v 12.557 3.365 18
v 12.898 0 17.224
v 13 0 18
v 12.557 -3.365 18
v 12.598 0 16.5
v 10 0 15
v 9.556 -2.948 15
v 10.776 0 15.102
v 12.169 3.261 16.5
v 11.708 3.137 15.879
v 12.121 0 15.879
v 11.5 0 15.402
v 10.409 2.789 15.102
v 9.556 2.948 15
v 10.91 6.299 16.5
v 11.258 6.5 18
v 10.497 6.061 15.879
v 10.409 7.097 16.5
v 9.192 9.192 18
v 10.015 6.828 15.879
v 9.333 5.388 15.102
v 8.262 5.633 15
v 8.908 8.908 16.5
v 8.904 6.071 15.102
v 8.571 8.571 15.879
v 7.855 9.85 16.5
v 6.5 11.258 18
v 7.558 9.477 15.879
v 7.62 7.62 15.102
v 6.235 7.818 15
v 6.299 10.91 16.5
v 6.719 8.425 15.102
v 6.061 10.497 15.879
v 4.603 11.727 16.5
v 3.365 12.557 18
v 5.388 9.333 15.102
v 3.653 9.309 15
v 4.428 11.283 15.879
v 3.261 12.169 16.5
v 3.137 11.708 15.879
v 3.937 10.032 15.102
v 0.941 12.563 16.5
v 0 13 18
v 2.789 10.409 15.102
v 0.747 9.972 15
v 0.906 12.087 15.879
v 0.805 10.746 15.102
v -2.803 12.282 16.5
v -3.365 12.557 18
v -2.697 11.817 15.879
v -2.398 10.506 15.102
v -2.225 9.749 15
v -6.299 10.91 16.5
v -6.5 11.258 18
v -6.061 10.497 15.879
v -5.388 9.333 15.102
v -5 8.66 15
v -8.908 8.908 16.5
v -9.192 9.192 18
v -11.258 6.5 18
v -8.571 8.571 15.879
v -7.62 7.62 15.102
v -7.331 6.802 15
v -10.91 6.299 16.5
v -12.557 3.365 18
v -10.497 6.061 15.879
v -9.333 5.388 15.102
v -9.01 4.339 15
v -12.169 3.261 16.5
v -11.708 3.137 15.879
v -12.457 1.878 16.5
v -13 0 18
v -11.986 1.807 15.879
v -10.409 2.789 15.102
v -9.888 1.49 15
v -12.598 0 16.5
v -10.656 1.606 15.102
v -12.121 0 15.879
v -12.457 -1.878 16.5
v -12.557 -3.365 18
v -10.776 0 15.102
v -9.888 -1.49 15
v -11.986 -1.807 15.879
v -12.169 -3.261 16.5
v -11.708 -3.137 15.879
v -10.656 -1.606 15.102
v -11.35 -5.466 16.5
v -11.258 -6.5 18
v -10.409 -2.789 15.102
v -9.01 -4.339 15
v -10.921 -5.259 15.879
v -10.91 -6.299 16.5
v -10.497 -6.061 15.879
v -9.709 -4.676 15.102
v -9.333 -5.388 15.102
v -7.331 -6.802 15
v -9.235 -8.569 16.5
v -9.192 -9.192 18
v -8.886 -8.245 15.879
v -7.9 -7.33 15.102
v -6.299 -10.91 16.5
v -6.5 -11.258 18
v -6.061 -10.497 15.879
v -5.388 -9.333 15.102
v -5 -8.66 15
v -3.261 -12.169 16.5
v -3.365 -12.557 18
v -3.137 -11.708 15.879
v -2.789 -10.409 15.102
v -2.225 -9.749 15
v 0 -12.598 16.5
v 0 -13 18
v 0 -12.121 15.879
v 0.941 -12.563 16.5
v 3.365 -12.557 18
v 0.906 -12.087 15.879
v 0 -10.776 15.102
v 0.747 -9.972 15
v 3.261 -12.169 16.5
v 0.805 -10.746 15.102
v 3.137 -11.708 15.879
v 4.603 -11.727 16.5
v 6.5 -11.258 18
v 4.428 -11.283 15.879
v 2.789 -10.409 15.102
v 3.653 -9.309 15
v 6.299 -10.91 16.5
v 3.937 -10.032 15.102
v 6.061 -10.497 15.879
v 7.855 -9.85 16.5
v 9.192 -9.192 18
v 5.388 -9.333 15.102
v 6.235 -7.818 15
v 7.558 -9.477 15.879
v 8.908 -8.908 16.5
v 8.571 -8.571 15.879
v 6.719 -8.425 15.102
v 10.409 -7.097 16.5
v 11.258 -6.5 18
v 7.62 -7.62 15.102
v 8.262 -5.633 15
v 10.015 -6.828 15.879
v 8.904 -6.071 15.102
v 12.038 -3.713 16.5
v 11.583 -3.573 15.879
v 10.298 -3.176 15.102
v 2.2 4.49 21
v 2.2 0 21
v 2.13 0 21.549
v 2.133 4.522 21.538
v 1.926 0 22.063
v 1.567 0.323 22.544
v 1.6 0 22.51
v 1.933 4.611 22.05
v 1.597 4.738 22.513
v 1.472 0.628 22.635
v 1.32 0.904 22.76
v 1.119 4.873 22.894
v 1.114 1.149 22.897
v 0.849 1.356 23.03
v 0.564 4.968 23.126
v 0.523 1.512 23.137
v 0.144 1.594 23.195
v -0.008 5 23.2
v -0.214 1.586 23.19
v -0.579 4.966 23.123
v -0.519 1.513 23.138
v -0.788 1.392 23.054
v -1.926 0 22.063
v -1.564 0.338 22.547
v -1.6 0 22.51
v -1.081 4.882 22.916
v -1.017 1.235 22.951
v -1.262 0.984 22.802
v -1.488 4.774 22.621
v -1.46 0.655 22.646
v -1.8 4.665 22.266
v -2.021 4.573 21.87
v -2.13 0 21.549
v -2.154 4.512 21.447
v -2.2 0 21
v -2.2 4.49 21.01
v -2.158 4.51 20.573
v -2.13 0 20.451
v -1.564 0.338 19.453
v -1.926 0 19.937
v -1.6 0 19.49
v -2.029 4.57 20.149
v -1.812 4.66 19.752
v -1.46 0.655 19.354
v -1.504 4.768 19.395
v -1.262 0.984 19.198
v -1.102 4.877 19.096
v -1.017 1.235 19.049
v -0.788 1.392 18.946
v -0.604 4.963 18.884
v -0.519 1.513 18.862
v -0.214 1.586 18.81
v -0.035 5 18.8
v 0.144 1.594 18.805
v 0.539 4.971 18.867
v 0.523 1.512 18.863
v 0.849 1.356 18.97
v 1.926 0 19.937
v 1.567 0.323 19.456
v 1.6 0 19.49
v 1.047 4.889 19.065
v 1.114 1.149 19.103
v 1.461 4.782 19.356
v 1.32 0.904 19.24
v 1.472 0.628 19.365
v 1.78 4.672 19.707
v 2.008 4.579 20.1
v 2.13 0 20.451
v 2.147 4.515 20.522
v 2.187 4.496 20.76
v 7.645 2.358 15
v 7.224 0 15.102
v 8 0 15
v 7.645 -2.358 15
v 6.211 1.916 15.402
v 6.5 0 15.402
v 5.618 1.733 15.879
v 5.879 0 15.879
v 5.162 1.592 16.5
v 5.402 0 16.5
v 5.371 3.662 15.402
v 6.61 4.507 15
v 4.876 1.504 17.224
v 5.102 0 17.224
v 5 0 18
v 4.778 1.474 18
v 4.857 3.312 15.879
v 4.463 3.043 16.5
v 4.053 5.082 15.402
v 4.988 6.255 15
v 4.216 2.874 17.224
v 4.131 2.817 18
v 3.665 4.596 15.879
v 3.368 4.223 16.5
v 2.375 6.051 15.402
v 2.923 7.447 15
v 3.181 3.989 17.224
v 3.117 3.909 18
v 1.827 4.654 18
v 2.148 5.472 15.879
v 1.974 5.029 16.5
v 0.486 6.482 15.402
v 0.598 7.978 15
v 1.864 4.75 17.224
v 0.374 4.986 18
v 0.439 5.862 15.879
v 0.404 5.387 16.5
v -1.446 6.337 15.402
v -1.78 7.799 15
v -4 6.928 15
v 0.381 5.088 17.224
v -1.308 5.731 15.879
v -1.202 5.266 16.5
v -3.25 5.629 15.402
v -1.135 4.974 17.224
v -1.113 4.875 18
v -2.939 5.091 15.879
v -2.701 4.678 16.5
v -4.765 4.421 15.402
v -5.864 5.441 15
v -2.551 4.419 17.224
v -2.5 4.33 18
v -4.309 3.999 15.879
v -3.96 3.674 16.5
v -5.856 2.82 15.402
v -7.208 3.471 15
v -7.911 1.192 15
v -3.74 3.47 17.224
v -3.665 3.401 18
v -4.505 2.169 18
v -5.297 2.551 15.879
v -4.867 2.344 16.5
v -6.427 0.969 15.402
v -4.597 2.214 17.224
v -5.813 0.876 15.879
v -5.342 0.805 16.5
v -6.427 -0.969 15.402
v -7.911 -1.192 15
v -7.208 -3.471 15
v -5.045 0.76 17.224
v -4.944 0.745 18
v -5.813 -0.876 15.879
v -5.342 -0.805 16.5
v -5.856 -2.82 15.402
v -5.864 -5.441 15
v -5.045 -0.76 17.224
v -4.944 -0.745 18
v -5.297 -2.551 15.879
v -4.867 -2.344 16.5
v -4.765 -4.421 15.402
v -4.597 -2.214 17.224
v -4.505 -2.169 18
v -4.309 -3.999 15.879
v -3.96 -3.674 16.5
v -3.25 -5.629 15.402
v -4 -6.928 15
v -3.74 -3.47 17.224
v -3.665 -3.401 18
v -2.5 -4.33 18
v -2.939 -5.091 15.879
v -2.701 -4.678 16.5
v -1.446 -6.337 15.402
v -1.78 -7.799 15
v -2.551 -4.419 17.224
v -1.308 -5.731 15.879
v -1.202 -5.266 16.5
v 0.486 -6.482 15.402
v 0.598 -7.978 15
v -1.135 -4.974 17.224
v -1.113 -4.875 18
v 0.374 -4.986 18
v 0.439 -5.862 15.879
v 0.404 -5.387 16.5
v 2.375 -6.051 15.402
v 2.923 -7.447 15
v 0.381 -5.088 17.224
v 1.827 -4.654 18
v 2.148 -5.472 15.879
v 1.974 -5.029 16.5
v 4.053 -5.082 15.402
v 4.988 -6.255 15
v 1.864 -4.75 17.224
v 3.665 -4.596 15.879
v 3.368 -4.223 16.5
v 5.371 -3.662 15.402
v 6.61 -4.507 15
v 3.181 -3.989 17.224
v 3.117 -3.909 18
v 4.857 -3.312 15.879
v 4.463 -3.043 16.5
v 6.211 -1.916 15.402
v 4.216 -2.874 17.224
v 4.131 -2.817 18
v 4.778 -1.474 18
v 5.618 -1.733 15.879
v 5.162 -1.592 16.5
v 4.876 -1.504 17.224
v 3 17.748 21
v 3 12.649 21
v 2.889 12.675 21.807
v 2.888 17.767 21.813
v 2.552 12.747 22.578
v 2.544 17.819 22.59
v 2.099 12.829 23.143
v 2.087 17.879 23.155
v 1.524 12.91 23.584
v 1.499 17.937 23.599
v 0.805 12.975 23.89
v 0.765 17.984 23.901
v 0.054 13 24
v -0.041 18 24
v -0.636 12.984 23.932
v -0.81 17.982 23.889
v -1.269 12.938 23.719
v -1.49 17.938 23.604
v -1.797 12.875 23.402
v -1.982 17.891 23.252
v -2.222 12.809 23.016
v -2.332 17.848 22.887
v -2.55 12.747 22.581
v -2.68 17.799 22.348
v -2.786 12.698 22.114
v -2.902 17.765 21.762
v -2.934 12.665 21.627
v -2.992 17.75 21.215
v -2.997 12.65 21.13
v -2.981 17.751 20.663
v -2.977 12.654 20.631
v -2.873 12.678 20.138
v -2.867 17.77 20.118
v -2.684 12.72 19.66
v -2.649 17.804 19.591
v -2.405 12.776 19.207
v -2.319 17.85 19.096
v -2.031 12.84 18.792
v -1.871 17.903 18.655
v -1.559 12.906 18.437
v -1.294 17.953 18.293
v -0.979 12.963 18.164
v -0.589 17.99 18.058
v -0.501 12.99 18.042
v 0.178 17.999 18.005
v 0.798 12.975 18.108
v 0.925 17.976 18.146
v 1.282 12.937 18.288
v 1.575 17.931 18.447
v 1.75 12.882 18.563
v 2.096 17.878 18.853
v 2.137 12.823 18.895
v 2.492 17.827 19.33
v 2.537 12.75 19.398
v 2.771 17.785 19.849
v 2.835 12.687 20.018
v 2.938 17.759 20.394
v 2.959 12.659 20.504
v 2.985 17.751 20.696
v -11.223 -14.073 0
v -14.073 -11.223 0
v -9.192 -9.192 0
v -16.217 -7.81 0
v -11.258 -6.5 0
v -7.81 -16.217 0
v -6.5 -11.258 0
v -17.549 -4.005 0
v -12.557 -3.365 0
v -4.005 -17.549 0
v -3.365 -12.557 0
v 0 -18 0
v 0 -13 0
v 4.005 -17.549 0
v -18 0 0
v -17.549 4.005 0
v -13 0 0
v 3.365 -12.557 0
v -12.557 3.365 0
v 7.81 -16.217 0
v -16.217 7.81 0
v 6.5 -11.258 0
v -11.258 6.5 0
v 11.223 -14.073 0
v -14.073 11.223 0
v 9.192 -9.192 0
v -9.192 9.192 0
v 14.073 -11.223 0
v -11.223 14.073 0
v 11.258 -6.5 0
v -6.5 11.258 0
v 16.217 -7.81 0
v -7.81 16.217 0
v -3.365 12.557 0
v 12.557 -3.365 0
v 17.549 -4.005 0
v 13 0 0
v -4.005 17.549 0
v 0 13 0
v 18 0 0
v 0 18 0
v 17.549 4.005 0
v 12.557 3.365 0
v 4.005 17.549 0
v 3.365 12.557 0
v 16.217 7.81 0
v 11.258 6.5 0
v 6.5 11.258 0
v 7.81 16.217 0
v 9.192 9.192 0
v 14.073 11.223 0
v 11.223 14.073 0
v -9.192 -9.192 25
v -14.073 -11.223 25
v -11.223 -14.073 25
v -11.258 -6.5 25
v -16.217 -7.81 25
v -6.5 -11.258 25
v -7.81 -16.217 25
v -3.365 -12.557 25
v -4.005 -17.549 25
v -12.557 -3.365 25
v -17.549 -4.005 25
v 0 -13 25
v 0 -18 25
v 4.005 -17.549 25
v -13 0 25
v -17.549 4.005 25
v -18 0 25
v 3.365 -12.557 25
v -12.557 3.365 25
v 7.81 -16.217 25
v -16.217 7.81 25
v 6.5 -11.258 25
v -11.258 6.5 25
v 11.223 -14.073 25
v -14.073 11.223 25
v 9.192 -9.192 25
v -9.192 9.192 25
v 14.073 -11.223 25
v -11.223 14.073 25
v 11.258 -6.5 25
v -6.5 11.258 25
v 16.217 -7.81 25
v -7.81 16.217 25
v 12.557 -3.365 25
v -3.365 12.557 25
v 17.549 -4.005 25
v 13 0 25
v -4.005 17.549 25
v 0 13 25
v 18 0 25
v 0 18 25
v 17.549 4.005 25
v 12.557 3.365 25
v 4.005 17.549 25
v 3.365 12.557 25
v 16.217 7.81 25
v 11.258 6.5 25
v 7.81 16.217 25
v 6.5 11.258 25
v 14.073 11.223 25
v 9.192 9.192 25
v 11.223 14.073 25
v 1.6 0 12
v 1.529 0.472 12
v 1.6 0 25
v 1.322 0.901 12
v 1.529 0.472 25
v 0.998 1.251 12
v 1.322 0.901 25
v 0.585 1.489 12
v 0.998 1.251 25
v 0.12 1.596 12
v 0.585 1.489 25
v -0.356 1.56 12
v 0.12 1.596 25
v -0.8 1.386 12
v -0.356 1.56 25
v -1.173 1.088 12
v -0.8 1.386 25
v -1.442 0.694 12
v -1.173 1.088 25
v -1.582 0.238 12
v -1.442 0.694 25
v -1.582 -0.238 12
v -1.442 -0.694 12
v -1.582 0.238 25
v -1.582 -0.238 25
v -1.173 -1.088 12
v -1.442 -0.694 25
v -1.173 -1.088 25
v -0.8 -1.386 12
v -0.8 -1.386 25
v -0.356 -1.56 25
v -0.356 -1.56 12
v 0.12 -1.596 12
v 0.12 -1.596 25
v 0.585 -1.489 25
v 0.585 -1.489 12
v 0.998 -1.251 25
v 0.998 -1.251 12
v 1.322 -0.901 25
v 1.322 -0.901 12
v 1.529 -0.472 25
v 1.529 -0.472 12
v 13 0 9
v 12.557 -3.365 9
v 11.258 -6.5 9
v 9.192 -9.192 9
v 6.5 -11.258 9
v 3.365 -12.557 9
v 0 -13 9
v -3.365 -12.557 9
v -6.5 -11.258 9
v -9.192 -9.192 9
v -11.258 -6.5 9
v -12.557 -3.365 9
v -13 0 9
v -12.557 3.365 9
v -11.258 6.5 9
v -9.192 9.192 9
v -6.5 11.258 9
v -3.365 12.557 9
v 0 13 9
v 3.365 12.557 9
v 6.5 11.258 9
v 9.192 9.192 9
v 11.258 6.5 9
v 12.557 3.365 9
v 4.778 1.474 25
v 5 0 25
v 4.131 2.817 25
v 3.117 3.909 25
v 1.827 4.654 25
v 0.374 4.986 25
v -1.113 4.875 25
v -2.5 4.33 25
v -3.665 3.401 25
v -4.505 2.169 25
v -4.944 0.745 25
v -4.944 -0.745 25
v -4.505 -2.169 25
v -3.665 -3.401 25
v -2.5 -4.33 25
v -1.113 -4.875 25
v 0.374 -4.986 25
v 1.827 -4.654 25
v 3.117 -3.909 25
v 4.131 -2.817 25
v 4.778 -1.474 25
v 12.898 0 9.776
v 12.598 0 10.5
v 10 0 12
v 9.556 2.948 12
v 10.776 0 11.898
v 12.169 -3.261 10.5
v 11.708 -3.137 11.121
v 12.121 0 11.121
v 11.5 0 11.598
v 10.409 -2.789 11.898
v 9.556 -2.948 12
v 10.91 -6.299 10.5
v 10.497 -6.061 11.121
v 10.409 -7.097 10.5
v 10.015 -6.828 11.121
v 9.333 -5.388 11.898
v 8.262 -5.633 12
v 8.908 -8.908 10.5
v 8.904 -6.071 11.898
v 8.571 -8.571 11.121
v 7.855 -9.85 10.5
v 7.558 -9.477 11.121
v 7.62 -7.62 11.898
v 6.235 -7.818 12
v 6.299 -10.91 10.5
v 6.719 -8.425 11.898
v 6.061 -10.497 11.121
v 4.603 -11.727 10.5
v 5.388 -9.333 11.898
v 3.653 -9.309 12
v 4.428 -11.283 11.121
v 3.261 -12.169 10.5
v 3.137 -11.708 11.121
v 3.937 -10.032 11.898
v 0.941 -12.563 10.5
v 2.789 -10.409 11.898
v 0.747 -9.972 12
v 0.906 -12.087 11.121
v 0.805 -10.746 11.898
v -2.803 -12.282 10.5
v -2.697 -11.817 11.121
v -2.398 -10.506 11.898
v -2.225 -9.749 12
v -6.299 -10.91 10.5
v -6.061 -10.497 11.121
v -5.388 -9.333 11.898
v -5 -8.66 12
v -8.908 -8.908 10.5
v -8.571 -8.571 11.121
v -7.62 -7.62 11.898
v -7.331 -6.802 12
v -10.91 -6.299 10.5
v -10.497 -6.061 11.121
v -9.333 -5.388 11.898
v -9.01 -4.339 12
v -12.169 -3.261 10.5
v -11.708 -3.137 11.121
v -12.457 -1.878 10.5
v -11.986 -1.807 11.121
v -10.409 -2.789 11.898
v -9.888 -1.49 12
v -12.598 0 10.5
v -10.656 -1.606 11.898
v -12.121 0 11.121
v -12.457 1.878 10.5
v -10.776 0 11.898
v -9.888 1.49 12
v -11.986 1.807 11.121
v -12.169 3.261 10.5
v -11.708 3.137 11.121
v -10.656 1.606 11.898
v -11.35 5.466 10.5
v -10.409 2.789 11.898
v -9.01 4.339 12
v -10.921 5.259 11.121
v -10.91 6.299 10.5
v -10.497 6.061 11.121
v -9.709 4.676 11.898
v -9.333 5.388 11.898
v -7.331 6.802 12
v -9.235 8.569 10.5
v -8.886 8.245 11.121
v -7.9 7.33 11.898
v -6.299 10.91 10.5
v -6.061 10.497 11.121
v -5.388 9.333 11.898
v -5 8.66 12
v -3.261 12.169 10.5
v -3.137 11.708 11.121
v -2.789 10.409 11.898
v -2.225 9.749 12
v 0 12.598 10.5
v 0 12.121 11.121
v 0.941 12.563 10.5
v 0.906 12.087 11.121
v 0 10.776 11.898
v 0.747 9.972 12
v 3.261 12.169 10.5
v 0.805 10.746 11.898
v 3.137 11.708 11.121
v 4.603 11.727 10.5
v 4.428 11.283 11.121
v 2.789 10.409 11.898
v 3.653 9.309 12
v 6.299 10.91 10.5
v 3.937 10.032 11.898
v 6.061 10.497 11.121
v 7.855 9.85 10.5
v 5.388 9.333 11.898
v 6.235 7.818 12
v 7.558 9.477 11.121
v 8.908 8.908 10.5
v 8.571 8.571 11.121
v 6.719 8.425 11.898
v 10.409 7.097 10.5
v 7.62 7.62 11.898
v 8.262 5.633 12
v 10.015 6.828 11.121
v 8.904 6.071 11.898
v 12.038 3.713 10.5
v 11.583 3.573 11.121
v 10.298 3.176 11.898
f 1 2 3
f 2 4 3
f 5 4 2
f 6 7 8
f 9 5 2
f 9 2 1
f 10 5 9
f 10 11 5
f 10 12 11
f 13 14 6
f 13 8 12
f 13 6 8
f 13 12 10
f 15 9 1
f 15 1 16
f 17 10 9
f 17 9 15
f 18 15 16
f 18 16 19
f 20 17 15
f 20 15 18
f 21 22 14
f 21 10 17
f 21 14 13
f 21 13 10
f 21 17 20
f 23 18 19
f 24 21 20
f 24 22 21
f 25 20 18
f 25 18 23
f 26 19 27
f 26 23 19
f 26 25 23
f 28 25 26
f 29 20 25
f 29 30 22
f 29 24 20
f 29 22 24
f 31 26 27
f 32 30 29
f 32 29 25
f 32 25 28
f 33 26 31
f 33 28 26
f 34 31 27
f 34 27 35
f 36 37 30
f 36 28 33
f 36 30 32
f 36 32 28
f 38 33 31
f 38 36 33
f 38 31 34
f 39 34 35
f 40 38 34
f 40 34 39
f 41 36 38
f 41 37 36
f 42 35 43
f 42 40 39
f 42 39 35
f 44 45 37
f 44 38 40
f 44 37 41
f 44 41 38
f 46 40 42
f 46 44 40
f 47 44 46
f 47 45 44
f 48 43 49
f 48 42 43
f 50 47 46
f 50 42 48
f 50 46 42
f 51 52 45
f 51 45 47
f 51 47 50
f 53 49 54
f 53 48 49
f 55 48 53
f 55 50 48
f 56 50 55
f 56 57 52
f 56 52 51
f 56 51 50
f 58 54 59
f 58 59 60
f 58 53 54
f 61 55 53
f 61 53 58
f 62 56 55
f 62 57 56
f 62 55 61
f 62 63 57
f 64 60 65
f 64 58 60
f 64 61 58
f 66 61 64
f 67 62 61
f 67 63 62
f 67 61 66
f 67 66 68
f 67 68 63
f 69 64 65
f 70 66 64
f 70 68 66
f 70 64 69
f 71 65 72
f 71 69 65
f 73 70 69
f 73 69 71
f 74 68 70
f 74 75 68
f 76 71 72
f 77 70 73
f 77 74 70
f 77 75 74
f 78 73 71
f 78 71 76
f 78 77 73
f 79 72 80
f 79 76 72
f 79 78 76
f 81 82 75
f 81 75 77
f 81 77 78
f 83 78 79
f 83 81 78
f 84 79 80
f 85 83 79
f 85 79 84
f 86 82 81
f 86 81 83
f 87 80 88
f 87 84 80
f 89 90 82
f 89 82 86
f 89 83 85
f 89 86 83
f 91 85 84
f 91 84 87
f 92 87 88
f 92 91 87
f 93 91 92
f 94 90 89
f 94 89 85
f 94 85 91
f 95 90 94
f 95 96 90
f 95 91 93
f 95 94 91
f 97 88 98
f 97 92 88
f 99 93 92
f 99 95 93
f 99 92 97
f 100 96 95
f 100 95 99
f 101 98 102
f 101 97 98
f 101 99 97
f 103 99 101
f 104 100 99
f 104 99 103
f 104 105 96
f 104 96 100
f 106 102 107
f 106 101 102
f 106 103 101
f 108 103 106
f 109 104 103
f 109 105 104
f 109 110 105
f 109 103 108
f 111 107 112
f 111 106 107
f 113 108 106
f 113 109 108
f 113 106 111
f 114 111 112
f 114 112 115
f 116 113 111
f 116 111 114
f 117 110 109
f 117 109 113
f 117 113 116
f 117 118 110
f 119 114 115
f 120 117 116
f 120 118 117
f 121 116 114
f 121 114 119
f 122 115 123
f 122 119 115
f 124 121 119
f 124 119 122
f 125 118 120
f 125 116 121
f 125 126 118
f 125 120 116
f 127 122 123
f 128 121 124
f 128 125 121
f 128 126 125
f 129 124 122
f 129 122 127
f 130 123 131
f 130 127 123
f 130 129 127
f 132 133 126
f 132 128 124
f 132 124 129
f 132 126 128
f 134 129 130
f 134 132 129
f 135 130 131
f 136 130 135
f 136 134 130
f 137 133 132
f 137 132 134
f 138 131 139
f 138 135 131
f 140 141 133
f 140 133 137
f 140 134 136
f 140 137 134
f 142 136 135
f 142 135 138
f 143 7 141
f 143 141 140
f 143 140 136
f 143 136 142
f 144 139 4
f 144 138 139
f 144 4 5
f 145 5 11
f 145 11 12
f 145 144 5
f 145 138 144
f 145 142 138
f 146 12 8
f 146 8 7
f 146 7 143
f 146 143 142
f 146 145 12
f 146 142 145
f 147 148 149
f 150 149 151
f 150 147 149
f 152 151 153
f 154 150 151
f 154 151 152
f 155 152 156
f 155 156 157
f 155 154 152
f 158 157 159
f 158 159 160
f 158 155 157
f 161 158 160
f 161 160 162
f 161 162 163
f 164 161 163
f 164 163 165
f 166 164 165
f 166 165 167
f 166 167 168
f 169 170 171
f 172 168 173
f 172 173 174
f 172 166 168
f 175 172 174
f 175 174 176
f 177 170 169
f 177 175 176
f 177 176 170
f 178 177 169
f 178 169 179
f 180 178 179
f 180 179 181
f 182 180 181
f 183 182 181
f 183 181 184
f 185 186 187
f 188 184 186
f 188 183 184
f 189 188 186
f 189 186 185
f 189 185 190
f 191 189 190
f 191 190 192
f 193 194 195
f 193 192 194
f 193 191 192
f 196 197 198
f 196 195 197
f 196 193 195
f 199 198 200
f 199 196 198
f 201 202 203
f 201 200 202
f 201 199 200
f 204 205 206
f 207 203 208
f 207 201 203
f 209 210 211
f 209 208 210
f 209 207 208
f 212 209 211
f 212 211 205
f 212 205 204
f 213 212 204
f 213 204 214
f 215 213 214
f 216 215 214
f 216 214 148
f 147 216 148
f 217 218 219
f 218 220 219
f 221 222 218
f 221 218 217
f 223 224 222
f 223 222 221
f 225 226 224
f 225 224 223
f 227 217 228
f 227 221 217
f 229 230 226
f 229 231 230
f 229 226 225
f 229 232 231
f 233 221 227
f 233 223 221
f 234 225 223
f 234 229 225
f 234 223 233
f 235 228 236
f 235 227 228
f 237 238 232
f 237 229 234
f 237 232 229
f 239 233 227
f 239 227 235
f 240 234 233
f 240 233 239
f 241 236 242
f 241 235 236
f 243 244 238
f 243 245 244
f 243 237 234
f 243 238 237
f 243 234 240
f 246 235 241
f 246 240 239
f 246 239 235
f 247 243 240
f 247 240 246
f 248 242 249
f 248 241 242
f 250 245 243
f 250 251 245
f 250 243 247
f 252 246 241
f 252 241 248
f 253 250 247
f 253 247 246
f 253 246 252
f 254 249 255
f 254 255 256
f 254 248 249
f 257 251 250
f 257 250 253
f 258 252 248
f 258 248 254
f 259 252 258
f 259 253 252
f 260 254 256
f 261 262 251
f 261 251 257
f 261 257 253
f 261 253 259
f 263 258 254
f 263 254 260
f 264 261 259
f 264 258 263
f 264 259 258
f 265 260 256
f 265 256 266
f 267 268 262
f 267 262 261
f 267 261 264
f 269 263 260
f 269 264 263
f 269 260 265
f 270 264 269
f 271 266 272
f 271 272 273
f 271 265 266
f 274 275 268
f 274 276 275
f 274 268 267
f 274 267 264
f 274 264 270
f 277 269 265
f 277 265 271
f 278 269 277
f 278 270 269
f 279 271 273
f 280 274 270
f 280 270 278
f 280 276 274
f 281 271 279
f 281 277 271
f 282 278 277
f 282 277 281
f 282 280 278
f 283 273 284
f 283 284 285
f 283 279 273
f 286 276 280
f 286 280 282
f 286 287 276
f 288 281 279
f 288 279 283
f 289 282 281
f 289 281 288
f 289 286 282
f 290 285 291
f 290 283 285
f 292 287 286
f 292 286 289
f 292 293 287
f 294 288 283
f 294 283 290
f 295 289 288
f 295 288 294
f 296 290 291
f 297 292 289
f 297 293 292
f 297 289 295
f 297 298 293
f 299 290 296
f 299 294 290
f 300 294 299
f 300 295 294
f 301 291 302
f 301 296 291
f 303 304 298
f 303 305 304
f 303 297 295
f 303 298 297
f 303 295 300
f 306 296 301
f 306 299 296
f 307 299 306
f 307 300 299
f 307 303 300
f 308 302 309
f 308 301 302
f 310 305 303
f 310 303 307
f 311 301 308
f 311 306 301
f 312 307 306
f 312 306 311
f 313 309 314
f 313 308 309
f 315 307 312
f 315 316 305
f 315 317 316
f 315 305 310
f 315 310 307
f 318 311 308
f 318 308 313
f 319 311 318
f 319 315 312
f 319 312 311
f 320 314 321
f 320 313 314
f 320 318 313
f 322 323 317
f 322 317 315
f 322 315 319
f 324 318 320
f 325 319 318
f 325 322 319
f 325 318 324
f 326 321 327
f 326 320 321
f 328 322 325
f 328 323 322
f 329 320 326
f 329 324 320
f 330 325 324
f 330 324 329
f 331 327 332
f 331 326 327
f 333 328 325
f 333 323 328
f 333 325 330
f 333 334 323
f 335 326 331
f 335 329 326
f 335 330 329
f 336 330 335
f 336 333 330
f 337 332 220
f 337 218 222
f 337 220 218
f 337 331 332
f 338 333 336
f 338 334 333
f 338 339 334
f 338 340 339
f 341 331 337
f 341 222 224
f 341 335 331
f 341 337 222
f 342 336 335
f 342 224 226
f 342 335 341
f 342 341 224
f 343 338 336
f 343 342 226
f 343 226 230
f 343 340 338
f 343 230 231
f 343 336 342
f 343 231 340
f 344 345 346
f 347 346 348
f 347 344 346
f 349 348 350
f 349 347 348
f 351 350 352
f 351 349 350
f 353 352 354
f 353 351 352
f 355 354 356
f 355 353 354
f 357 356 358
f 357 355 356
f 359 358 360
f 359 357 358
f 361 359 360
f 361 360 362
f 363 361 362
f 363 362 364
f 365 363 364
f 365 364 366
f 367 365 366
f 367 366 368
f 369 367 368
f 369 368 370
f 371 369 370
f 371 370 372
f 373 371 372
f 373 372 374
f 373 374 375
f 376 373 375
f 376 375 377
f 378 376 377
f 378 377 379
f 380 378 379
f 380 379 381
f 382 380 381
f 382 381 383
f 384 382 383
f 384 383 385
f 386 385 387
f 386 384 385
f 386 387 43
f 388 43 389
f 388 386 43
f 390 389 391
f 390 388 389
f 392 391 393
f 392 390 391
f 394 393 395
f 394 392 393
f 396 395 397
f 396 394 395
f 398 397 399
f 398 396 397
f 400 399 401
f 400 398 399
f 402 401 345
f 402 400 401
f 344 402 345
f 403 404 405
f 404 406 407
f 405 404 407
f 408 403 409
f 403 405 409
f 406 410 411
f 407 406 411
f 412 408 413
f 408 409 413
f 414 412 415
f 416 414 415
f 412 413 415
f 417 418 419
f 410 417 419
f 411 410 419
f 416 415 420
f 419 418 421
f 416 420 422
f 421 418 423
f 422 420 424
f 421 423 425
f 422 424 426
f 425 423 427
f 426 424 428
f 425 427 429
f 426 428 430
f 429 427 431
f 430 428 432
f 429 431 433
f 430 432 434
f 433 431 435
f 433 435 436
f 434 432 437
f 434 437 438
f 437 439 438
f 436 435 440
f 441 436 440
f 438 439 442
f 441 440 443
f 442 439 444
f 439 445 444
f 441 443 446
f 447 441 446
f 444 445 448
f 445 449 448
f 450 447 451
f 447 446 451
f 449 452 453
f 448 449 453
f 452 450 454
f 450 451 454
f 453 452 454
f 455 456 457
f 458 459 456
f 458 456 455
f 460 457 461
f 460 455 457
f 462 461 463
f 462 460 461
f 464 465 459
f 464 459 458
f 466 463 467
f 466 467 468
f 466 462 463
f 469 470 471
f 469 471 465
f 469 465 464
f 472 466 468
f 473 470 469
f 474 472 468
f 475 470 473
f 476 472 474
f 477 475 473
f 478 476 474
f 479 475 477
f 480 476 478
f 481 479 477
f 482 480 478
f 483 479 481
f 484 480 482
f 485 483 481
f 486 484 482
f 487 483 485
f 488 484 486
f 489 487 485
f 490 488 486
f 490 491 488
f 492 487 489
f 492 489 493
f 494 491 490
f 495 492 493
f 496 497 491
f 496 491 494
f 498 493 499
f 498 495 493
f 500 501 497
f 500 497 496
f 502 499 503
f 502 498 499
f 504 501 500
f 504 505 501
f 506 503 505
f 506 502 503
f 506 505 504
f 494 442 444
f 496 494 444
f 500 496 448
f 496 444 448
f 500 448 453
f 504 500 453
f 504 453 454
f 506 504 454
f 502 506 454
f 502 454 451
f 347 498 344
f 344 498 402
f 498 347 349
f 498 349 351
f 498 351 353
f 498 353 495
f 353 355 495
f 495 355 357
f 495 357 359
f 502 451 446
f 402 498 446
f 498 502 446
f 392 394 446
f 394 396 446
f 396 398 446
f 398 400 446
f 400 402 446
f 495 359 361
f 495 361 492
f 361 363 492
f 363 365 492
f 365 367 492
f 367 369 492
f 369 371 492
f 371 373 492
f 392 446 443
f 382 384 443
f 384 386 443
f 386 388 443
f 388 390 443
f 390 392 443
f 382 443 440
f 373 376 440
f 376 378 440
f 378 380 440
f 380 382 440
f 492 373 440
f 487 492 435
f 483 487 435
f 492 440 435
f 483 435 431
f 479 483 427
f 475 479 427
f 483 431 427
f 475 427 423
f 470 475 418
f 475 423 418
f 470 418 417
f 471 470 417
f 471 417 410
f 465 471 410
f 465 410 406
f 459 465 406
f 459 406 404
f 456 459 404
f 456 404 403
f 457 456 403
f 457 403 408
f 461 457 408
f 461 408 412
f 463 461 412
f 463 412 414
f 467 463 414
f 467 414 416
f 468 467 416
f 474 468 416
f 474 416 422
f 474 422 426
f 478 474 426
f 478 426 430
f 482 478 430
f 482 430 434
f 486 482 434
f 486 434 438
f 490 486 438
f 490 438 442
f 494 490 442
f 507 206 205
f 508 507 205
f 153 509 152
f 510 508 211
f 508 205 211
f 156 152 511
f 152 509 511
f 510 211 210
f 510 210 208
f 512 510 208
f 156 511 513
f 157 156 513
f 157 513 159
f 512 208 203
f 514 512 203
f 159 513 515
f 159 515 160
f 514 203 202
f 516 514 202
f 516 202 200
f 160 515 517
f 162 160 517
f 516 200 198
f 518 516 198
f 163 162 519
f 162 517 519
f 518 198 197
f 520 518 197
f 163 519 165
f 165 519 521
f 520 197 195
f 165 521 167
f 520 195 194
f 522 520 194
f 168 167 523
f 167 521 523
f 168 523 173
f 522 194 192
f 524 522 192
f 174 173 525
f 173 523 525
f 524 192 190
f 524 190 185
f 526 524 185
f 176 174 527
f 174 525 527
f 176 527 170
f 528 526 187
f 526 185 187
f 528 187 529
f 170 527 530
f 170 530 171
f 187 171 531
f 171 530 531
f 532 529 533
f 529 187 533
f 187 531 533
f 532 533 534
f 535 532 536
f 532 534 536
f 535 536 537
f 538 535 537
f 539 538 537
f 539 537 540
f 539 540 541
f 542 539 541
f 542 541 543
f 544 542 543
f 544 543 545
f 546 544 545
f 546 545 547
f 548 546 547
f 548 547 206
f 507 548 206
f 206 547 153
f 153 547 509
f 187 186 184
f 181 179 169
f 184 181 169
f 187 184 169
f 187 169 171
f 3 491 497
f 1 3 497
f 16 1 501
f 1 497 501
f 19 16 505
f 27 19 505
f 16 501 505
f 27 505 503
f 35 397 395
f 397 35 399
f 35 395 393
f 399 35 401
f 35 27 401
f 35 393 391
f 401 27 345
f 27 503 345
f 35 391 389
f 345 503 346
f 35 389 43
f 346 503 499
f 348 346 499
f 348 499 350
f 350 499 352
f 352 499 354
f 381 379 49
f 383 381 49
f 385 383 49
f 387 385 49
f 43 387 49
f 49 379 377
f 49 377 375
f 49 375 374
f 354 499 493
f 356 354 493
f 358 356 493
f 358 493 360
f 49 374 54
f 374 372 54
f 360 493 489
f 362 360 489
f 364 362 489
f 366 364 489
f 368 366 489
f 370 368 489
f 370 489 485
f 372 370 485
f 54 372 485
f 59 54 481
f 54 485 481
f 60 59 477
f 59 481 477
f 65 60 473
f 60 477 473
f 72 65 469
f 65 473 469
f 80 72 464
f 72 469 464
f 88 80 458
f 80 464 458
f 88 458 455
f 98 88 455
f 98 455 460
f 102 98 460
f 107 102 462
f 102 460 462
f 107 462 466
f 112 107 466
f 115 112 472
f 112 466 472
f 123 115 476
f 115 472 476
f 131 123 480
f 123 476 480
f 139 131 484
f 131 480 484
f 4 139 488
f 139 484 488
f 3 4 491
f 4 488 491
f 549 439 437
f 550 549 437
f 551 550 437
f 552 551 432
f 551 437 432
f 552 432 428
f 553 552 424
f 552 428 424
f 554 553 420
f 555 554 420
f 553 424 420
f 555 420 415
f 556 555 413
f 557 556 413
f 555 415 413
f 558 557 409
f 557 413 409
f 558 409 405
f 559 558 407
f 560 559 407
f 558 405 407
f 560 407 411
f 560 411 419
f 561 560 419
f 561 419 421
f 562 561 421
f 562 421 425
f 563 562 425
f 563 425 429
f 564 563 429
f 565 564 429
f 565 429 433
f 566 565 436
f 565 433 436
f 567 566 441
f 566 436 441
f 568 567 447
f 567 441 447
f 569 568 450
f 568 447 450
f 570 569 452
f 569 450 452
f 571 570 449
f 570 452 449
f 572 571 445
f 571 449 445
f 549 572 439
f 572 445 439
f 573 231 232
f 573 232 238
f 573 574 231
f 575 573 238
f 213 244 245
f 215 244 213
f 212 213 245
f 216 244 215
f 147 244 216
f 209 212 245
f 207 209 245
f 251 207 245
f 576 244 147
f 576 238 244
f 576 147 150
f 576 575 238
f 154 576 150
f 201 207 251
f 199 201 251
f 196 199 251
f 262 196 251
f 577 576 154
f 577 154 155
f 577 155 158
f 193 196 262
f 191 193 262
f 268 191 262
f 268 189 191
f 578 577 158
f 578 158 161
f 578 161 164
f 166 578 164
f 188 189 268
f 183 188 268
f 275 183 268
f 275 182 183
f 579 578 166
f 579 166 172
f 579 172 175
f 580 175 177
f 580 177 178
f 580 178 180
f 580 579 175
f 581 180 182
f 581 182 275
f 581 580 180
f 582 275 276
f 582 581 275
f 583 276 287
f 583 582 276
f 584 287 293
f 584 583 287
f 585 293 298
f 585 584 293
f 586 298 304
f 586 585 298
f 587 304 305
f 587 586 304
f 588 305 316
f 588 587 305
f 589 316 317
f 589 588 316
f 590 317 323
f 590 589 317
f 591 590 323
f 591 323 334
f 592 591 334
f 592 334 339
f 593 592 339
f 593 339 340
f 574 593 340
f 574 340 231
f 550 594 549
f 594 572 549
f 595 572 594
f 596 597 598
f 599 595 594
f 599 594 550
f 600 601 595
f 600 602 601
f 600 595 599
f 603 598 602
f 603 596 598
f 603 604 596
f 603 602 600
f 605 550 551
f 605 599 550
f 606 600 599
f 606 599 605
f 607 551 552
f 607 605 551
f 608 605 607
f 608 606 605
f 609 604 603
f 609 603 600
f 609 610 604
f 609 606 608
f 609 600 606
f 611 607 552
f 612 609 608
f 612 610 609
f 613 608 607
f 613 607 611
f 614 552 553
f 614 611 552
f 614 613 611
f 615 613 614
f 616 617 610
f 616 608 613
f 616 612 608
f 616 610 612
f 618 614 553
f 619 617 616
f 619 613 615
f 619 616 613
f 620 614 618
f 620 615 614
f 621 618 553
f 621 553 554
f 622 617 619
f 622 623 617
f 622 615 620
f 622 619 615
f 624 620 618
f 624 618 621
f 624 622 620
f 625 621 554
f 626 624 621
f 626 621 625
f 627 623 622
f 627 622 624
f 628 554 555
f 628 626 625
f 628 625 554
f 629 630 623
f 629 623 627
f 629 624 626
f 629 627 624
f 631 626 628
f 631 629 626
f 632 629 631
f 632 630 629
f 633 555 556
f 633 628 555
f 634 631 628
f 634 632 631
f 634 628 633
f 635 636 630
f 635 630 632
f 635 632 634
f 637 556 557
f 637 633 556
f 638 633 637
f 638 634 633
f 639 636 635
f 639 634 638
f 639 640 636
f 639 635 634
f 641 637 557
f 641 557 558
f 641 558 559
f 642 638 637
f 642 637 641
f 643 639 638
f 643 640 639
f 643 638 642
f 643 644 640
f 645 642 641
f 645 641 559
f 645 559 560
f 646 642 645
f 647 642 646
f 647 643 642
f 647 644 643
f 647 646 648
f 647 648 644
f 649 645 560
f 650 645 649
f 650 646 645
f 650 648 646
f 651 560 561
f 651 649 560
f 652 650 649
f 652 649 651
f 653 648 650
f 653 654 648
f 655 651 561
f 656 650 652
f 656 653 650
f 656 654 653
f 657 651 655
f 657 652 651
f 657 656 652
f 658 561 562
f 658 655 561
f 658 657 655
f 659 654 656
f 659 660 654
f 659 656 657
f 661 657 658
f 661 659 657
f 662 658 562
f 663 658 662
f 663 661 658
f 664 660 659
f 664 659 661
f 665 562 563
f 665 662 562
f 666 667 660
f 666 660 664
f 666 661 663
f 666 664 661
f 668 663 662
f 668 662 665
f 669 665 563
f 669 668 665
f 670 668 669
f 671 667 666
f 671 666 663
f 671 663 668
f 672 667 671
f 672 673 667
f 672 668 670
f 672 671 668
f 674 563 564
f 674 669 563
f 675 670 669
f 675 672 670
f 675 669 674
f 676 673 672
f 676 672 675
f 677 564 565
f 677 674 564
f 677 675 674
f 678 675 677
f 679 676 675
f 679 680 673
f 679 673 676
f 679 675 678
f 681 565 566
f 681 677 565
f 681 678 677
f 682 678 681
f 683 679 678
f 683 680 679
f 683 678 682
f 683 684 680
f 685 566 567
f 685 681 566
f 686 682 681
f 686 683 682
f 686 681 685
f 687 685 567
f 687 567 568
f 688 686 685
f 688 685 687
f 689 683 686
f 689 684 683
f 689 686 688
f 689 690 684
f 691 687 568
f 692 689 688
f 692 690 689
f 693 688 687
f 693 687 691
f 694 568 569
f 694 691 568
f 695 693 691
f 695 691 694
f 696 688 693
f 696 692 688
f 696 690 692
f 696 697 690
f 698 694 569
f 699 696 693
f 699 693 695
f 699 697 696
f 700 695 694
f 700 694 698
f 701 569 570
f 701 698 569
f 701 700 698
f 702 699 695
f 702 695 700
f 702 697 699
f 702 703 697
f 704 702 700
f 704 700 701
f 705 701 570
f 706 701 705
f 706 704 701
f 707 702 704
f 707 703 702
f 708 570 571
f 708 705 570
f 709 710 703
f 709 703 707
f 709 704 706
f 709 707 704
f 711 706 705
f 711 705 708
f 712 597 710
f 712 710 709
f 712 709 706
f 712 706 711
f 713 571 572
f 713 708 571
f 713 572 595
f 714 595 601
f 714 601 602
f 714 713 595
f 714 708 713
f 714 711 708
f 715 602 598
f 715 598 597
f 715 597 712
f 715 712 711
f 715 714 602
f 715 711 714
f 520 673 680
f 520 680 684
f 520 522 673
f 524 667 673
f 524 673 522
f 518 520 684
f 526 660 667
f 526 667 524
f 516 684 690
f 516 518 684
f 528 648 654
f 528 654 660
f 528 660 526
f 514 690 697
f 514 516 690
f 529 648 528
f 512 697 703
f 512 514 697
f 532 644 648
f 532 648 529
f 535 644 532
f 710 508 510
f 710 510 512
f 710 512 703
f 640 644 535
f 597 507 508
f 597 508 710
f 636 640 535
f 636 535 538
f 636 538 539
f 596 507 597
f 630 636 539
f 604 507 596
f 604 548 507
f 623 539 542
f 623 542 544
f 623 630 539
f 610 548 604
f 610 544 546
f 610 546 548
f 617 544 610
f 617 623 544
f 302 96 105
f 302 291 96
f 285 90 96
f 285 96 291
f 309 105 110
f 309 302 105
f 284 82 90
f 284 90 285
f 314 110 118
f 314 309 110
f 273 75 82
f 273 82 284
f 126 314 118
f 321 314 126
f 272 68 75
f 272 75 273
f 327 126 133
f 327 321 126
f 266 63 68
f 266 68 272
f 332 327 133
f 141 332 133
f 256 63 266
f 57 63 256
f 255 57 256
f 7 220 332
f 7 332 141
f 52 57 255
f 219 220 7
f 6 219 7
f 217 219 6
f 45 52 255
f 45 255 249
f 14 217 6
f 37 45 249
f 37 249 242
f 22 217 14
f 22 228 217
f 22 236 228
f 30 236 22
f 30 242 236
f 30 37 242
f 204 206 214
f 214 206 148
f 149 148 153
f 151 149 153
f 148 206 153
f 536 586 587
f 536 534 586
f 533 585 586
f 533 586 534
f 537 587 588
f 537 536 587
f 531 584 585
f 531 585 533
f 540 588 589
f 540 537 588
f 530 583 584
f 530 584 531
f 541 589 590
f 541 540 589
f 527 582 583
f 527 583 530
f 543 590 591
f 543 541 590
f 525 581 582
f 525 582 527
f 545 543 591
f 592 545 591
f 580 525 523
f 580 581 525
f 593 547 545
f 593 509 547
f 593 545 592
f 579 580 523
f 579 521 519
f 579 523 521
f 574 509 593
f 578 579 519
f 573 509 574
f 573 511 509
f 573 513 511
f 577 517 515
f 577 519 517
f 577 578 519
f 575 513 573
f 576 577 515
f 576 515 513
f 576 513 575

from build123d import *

# Parameters (mm, degrees)
CYLINDER001_R     = 3
CYLINDER001_DEPTH = 9
CYLINDER_R        = 2.2
CYLINDER_DEPTH    = 9
SKETCH_R          = 18
PAD_DEPTH         = 25
SKETCH001_R       = 13
SKETCH001_R_2     = 5
POCKET_DEPTH      = 10
SKETCH002_R       = 13
POCKET001_DEPTH   = 12
SKETCH003_R       = 1.6
POCKET002_DEPTH   = 13
FILLET_R          = 3


with BuildPart() as cilindro001:
    # Cylinder001 → Cylinder001 (new body)
    with BuildSketch(Plane(origin=(0, 20, 21), x_dir=(1, 0, 0), z_dir=(0, -1, 0))):
        Circle(CYLINDER001_R)
    extrude(amount=CYLINDER001_DEPTH)


with BuildPart() as cilindro:
    # Cylinder → Cylinder (new body)
    with BuildSketch(Plane(origin=(0, 9, 21), x_dir=(1, 0, 0), z_dir=(0, -1, 0))):
        Circle(CYLINDER_R)
    extrude(amount=CYLINDER_DEPTH)


with BuildPart() as cut001:
    # Sketch → Pad (new body)
    with BuildSketch(Plane.XY):
        Circle(SKETCH_R)
    extrude(amount=PAD_DEPTH)

    # Sketch001 (on Face3 of Pad) → Pocket (cut)
    with BuildSketch(Plane.XY.offset(25)):
        Circle(SKETCH001_R)
        Circle(SKETCH001_R_2, mode=Mode.SUBTRACT)
    extrude(amount=-POCKET_DEPTH, mode=Mode.SUBTRACT)

    # Sketch002 (on Face2 of Pocket) → Pocket001 (cut)
    with BuildSketch(Plane(origin=(0, 0, 0), x_dir=(1, 0, 0), z_dir=(0, 0, -1))):
        Circle(SKETCH002_R)
    extrude(amount=-POCKET001_DEPTH, mode=Mode.SUBTRACT)

    # Sketch003 (on Face9 of Pocket001) → Pocket002 (cut)
    with BuildSketch(Plane.XY.offset(25)):
        Circle(SKETCH003_R)
    extrude(amount=-POCKET002_DEPTH, mode=Mode.SUBTRACT)

    # Fillet
    fillet_edges = [cut001.edges().sort_by_distance(p)[0] for p in [
        (-5, 0, 15),
        (-13, 0, 15),
        (-13, 0, 12),
    ]]
    fillet(fillet_edges, radius=FILLET_R)

    # Cut: cut Cilindro
    add(cilindro.part, mode=Mode.SUBTRACT)

    # Cut001: cut Cilindro001
    add(cilindro001.part, mode=Mode.SUBTRACT)


solid = cut001.part
